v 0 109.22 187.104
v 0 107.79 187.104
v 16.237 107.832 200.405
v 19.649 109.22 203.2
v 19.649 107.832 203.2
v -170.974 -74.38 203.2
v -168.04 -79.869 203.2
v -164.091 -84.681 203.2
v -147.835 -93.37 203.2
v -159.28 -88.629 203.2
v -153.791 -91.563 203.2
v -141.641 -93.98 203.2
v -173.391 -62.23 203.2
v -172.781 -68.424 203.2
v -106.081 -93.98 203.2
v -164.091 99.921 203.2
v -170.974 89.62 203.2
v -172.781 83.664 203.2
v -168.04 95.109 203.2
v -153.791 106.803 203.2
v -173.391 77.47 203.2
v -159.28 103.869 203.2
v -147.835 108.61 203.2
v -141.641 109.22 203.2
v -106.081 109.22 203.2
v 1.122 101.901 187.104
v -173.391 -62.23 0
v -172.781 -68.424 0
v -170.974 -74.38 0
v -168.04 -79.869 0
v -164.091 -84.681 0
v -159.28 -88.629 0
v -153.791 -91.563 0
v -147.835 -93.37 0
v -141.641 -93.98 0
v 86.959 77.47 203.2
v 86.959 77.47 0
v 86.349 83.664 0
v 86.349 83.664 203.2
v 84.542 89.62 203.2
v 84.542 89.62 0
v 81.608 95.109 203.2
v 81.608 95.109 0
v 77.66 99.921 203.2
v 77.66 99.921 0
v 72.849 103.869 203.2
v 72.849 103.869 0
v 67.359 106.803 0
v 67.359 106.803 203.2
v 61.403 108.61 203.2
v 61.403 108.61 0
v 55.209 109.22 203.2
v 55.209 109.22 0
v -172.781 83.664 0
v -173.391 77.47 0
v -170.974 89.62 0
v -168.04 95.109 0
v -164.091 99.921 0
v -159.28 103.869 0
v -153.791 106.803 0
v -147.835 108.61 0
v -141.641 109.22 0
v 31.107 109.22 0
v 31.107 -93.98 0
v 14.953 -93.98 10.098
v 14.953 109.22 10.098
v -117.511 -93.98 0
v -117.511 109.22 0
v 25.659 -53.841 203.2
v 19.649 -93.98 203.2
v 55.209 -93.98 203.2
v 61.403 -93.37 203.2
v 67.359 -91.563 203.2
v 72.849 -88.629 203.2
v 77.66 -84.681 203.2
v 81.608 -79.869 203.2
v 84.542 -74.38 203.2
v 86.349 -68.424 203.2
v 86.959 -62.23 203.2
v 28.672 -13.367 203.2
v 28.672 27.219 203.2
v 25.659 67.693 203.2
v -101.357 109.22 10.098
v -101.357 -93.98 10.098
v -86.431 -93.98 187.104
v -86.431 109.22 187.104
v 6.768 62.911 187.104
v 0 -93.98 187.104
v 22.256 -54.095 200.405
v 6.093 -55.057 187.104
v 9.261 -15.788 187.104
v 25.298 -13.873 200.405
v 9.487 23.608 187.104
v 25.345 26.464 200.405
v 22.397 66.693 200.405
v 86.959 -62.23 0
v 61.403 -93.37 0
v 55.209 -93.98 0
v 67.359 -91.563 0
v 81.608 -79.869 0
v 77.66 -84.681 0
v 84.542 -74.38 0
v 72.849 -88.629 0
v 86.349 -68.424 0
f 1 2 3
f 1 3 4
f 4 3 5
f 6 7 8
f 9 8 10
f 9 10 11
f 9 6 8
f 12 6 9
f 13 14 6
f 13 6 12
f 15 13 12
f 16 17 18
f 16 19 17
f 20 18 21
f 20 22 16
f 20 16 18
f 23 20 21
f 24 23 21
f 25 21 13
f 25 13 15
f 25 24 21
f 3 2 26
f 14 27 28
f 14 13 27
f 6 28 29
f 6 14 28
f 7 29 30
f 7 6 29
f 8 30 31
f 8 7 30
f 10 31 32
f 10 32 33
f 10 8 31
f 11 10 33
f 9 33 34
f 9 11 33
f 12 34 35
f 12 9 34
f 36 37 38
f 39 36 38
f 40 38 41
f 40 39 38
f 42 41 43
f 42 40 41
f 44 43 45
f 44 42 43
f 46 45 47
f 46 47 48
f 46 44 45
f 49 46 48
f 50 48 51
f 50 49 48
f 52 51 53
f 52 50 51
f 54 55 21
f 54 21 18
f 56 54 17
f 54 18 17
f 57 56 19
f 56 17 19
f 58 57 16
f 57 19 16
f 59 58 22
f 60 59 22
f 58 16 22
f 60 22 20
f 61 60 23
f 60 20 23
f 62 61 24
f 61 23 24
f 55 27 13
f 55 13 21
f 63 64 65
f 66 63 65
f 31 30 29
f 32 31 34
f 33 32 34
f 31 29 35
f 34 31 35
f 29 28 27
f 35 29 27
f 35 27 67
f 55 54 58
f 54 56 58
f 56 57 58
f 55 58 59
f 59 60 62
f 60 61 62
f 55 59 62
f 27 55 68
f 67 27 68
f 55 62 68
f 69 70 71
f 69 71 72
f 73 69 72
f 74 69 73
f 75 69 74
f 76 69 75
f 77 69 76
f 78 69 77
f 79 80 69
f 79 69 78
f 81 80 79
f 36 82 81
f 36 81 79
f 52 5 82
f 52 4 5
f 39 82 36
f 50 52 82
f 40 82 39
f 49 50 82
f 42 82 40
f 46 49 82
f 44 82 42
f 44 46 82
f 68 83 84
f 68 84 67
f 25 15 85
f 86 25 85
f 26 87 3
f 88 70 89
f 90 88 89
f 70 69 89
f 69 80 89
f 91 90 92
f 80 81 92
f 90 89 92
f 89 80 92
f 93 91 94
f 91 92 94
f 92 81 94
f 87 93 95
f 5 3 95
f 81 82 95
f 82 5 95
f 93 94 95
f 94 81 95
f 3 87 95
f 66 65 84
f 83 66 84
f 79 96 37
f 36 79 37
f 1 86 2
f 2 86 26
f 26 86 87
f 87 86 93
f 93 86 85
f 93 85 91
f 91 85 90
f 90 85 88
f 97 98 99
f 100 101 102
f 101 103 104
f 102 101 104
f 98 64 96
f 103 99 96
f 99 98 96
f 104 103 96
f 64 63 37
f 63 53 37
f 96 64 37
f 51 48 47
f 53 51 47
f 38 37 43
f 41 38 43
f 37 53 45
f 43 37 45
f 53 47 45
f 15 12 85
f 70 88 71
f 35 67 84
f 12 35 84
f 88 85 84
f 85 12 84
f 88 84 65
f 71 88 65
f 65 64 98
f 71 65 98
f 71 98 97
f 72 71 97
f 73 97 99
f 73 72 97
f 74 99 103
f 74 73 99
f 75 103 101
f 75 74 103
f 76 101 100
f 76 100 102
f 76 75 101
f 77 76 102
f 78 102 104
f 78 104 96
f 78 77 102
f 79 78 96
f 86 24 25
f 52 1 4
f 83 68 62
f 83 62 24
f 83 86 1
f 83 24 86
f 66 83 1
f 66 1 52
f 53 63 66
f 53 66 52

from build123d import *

# Parameters (mm, degrees)
F0_W     = 260.35
F0_H     = 203.2
F1_DEPTH = 203.2
F2_R     = 31.75
F4_DEPTH = 203.201


with BuildPart() as f1:
    # F0 (on Top) → F1 (new body)
    with BuildSketch(Plane.XY):
        with Locations((-43.21573, 7.619998)):
            Rectangle(F0_W, F0_H)
    extrude(amount=F1_DEPTH)

    # F2
    f2_edges = [f1.edges().sort_by_distance(p)[0] for p in [
        (-173.39073, 109.219998, 101.6),
        (-173.39073, -93.980002, 101.6),
        (86.95927, 109.219998, 101.6),
        (86.95927, -93.980002, 101.6),
    ]]
    fillet(f2_edges, radius=F2_R)

    # F3 (on face) → F4 (cut, through all)
    with BuildSketch(Plane.XZ.offset(93.980002)):
        Polygon((19.64927, 203.2), (-106.08073, 203.2), (-86.431459, 187.104467), (0, 187.104467), align=None)
        Polygon((-101.357388, 10.098124), (-117.510729, 0), (31.106714, 0), (14.953374, 10.098124), align=None)
    extrude(amount=-F4_DEPTH, mode=Mode.SUBTRACT)

    # F7: sweep along a path in F5
    with BuildLine(Plane.XY.offset(203.2)) as f7_path:
        ThreePointArc((20.038901, -93.980002), (29.431866, 7.632308), (19.77627, 109.219998))
        Line((19.77627, 109.219998), (14.249222, 138.23534))
    # F6 (on face) → F7 (sweep, cut)
    with BuildSketch(Plane.XZ.offset(93.980002)):
        Polygon((0, 187.104467), (19.64927, 203.2), (0, 203.2), (-25.094712, 203.330889), (-25.094712, 187.104467), align=None)
    sweep(path=f7_path.line, mode=Mode.SUBTRACT)


solid = f1.part
